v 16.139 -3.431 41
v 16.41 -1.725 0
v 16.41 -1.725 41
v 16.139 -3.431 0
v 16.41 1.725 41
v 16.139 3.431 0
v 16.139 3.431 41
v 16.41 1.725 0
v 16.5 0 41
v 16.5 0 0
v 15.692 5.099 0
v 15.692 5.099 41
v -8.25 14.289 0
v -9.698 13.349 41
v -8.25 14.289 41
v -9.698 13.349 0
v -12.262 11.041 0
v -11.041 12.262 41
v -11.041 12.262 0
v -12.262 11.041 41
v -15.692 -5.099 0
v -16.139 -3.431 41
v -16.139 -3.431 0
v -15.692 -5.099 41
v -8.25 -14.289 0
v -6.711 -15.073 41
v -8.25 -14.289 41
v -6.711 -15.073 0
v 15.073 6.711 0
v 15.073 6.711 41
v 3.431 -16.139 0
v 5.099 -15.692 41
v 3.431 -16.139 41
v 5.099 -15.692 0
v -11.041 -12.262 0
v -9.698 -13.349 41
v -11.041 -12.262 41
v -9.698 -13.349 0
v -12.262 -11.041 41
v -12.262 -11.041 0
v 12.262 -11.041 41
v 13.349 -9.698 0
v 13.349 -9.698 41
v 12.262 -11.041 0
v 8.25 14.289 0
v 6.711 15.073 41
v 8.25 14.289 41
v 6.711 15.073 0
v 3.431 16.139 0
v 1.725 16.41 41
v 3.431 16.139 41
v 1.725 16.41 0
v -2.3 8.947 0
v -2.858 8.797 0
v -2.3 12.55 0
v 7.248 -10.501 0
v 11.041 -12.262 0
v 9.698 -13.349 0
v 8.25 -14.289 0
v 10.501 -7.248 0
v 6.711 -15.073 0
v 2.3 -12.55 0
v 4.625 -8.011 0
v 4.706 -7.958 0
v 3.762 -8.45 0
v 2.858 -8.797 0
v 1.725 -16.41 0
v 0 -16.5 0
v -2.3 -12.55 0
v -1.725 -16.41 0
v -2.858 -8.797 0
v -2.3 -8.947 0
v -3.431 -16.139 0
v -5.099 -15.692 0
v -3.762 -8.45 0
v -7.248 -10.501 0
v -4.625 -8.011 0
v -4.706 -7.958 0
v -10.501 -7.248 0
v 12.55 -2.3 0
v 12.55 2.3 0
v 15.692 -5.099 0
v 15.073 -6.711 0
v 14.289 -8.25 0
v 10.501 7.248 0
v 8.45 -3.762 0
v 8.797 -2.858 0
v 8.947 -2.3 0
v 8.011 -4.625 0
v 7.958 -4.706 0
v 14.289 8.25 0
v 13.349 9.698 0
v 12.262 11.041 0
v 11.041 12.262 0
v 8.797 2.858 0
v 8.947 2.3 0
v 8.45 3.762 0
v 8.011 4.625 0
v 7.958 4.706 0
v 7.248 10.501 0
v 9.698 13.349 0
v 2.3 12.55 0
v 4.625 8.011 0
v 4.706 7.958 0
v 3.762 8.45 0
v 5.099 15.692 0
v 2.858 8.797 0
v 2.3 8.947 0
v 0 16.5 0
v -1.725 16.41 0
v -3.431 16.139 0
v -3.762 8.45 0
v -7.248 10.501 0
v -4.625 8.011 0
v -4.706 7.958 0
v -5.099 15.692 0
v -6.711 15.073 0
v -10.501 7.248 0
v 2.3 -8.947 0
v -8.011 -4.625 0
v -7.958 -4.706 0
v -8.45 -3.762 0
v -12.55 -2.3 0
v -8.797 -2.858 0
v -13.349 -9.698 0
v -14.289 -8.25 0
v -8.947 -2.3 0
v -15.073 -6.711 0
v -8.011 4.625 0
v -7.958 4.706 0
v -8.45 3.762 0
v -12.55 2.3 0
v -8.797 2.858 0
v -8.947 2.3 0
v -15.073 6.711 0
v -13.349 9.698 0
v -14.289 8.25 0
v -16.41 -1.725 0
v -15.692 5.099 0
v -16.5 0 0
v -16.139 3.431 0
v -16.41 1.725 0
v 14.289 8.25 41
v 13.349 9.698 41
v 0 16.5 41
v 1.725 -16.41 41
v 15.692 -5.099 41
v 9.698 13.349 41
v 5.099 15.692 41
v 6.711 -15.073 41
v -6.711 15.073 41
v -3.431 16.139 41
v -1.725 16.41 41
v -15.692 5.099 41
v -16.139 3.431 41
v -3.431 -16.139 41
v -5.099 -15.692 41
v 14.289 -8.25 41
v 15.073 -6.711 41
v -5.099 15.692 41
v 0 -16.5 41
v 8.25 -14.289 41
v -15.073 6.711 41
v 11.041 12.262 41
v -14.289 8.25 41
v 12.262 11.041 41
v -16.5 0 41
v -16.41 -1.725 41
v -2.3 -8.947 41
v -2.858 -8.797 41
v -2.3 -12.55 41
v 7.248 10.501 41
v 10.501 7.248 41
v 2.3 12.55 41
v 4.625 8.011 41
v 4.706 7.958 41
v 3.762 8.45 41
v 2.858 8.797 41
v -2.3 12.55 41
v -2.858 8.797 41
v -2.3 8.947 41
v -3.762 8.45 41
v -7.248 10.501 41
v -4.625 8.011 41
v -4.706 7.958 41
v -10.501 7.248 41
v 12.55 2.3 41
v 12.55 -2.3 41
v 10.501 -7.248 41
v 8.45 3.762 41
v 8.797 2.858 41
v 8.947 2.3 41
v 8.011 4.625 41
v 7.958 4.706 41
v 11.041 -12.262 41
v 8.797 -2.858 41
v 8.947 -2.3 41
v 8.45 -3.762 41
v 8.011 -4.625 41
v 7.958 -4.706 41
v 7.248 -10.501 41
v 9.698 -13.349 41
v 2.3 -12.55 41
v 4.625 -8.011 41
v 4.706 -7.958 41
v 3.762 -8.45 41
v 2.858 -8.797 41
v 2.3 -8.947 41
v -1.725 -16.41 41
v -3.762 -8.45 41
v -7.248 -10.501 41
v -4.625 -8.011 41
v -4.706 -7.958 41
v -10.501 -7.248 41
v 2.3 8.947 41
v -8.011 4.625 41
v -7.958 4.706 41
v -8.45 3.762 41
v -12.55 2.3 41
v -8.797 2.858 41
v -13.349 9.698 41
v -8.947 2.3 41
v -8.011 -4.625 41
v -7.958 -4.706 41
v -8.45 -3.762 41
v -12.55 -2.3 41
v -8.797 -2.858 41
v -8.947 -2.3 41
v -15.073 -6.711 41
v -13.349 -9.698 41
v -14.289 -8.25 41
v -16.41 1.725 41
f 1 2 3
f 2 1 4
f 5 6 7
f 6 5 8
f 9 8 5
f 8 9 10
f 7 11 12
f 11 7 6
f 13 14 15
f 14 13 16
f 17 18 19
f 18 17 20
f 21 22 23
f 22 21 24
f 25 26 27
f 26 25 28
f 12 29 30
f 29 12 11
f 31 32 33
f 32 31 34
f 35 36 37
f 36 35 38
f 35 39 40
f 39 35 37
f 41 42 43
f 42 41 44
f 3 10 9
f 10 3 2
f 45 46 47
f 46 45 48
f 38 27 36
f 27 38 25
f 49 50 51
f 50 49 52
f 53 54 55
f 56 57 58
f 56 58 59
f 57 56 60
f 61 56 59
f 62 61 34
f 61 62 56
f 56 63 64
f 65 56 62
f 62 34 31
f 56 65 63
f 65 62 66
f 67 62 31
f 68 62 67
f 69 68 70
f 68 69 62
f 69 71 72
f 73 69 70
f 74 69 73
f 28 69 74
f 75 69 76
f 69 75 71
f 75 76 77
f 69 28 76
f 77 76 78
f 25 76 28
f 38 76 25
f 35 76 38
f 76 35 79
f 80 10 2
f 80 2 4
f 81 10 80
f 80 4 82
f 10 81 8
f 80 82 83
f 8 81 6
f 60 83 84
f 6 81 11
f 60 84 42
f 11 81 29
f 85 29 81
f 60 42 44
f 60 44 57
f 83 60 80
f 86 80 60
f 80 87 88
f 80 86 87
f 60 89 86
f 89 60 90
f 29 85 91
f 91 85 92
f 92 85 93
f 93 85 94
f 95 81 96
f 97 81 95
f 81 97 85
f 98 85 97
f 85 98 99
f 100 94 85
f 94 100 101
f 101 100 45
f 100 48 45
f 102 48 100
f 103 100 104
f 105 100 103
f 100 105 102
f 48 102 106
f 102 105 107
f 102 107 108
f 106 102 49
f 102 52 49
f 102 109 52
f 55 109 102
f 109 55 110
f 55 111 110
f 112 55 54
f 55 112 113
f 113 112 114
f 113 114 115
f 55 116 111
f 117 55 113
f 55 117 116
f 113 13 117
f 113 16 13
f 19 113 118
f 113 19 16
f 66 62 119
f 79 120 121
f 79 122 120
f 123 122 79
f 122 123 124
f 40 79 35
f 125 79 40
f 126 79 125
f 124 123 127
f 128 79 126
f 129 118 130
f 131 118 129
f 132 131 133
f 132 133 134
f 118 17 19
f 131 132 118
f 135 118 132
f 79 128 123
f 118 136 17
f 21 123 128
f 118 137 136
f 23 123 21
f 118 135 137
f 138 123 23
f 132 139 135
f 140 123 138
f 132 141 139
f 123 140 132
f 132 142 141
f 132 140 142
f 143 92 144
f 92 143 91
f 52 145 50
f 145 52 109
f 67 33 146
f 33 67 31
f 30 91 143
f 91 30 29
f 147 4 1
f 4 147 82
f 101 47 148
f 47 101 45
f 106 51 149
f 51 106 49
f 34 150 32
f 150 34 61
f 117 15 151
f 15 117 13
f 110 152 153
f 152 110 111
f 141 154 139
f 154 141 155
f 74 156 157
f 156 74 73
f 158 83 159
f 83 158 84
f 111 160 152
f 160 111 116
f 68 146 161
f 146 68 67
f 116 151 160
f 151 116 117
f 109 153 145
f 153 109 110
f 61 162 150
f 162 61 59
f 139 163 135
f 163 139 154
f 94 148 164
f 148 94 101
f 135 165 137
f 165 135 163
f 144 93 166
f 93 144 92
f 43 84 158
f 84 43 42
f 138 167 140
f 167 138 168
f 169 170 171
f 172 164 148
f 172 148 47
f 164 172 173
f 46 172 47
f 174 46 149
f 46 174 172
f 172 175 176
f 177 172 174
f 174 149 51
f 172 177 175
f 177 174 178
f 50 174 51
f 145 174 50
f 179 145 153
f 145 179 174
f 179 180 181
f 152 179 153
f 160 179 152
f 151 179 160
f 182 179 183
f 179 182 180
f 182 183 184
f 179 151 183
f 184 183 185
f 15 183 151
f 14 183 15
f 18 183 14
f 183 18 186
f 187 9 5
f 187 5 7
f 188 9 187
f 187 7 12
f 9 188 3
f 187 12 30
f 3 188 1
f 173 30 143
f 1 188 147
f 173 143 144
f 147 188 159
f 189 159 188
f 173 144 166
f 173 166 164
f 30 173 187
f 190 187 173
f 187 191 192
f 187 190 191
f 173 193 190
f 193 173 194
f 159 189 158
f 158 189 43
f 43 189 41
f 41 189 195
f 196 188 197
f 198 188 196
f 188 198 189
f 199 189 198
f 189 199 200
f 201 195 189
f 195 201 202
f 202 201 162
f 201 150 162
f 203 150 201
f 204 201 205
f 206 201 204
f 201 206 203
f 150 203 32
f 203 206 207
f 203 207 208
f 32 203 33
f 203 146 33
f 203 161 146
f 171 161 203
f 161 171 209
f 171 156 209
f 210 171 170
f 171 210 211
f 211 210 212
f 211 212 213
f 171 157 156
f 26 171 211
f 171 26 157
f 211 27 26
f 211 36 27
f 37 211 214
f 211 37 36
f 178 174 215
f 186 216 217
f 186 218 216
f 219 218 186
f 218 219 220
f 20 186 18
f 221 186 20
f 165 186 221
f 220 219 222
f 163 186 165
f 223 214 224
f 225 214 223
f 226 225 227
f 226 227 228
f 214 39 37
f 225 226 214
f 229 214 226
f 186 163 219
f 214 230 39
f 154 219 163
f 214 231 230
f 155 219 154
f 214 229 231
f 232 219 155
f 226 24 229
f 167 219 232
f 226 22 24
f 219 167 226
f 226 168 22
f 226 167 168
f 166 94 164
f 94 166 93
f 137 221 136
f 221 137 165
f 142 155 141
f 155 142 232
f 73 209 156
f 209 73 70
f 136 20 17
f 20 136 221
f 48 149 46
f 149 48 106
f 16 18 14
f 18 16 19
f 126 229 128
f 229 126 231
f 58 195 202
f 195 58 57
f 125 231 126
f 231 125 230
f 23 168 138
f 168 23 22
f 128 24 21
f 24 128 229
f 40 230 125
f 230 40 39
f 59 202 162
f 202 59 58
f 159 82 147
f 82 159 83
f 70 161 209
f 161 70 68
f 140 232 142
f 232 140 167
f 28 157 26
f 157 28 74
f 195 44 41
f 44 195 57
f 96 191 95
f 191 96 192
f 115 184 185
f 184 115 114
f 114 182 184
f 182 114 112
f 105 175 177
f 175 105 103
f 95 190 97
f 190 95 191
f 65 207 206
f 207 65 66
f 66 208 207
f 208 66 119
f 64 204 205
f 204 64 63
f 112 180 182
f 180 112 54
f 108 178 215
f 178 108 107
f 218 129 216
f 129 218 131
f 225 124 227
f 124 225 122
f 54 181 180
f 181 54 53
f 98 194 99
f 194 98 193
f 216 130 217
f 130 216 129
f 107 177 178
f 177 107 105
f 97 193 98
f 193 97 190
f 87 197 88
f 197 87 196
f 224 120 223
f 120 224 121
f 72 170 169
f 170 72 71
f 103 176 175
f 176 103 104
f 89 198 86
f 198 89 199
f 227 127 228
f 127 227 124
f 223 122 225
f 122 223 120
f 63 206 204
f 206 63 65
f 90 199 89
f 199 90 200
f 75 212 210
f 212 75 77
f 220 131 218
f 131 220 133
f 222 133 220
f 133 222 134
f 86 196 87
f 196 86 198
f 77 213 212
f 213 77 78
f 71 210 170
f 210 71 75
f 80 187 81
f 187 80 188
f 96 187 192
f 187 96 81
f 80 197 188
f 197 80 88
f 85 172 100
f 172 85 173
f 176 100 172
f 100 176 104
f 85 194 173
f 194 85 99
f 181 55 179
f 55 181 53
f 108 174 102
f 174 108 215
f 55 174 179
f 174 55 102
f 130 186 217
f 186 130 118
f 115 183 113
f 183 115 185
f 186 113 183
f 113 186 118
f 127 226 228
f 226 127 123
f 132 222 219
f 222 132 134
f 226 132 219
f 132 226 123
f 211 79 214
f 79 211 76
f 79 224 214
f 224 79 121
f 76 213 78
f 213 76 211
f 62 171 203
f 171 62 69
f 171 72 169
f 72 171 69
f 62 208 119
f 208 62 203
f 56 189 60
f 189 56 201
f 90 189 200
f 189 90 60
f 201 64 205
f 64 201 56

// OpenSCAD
$fn=60; 

outer_diameter = 33;
inner_diameter = 18.5;
height = 41;
spoke_depth = 4.3;
spoke_width = 4.6;
difference(){
    difference(){
    cylinder(height,d=outer_diameter);
    cylinder(height,d=inner_diameter);
    }

    for(angle=[0:45:360]){
        rotate([0,0,angle]){
            translate([(inner_diameter/2)+(spoke_depth/2)-2,0,height/2]){
                cube([spoke_depth+2,spoke_width,height],center=true);
            }
        }
    }
}
